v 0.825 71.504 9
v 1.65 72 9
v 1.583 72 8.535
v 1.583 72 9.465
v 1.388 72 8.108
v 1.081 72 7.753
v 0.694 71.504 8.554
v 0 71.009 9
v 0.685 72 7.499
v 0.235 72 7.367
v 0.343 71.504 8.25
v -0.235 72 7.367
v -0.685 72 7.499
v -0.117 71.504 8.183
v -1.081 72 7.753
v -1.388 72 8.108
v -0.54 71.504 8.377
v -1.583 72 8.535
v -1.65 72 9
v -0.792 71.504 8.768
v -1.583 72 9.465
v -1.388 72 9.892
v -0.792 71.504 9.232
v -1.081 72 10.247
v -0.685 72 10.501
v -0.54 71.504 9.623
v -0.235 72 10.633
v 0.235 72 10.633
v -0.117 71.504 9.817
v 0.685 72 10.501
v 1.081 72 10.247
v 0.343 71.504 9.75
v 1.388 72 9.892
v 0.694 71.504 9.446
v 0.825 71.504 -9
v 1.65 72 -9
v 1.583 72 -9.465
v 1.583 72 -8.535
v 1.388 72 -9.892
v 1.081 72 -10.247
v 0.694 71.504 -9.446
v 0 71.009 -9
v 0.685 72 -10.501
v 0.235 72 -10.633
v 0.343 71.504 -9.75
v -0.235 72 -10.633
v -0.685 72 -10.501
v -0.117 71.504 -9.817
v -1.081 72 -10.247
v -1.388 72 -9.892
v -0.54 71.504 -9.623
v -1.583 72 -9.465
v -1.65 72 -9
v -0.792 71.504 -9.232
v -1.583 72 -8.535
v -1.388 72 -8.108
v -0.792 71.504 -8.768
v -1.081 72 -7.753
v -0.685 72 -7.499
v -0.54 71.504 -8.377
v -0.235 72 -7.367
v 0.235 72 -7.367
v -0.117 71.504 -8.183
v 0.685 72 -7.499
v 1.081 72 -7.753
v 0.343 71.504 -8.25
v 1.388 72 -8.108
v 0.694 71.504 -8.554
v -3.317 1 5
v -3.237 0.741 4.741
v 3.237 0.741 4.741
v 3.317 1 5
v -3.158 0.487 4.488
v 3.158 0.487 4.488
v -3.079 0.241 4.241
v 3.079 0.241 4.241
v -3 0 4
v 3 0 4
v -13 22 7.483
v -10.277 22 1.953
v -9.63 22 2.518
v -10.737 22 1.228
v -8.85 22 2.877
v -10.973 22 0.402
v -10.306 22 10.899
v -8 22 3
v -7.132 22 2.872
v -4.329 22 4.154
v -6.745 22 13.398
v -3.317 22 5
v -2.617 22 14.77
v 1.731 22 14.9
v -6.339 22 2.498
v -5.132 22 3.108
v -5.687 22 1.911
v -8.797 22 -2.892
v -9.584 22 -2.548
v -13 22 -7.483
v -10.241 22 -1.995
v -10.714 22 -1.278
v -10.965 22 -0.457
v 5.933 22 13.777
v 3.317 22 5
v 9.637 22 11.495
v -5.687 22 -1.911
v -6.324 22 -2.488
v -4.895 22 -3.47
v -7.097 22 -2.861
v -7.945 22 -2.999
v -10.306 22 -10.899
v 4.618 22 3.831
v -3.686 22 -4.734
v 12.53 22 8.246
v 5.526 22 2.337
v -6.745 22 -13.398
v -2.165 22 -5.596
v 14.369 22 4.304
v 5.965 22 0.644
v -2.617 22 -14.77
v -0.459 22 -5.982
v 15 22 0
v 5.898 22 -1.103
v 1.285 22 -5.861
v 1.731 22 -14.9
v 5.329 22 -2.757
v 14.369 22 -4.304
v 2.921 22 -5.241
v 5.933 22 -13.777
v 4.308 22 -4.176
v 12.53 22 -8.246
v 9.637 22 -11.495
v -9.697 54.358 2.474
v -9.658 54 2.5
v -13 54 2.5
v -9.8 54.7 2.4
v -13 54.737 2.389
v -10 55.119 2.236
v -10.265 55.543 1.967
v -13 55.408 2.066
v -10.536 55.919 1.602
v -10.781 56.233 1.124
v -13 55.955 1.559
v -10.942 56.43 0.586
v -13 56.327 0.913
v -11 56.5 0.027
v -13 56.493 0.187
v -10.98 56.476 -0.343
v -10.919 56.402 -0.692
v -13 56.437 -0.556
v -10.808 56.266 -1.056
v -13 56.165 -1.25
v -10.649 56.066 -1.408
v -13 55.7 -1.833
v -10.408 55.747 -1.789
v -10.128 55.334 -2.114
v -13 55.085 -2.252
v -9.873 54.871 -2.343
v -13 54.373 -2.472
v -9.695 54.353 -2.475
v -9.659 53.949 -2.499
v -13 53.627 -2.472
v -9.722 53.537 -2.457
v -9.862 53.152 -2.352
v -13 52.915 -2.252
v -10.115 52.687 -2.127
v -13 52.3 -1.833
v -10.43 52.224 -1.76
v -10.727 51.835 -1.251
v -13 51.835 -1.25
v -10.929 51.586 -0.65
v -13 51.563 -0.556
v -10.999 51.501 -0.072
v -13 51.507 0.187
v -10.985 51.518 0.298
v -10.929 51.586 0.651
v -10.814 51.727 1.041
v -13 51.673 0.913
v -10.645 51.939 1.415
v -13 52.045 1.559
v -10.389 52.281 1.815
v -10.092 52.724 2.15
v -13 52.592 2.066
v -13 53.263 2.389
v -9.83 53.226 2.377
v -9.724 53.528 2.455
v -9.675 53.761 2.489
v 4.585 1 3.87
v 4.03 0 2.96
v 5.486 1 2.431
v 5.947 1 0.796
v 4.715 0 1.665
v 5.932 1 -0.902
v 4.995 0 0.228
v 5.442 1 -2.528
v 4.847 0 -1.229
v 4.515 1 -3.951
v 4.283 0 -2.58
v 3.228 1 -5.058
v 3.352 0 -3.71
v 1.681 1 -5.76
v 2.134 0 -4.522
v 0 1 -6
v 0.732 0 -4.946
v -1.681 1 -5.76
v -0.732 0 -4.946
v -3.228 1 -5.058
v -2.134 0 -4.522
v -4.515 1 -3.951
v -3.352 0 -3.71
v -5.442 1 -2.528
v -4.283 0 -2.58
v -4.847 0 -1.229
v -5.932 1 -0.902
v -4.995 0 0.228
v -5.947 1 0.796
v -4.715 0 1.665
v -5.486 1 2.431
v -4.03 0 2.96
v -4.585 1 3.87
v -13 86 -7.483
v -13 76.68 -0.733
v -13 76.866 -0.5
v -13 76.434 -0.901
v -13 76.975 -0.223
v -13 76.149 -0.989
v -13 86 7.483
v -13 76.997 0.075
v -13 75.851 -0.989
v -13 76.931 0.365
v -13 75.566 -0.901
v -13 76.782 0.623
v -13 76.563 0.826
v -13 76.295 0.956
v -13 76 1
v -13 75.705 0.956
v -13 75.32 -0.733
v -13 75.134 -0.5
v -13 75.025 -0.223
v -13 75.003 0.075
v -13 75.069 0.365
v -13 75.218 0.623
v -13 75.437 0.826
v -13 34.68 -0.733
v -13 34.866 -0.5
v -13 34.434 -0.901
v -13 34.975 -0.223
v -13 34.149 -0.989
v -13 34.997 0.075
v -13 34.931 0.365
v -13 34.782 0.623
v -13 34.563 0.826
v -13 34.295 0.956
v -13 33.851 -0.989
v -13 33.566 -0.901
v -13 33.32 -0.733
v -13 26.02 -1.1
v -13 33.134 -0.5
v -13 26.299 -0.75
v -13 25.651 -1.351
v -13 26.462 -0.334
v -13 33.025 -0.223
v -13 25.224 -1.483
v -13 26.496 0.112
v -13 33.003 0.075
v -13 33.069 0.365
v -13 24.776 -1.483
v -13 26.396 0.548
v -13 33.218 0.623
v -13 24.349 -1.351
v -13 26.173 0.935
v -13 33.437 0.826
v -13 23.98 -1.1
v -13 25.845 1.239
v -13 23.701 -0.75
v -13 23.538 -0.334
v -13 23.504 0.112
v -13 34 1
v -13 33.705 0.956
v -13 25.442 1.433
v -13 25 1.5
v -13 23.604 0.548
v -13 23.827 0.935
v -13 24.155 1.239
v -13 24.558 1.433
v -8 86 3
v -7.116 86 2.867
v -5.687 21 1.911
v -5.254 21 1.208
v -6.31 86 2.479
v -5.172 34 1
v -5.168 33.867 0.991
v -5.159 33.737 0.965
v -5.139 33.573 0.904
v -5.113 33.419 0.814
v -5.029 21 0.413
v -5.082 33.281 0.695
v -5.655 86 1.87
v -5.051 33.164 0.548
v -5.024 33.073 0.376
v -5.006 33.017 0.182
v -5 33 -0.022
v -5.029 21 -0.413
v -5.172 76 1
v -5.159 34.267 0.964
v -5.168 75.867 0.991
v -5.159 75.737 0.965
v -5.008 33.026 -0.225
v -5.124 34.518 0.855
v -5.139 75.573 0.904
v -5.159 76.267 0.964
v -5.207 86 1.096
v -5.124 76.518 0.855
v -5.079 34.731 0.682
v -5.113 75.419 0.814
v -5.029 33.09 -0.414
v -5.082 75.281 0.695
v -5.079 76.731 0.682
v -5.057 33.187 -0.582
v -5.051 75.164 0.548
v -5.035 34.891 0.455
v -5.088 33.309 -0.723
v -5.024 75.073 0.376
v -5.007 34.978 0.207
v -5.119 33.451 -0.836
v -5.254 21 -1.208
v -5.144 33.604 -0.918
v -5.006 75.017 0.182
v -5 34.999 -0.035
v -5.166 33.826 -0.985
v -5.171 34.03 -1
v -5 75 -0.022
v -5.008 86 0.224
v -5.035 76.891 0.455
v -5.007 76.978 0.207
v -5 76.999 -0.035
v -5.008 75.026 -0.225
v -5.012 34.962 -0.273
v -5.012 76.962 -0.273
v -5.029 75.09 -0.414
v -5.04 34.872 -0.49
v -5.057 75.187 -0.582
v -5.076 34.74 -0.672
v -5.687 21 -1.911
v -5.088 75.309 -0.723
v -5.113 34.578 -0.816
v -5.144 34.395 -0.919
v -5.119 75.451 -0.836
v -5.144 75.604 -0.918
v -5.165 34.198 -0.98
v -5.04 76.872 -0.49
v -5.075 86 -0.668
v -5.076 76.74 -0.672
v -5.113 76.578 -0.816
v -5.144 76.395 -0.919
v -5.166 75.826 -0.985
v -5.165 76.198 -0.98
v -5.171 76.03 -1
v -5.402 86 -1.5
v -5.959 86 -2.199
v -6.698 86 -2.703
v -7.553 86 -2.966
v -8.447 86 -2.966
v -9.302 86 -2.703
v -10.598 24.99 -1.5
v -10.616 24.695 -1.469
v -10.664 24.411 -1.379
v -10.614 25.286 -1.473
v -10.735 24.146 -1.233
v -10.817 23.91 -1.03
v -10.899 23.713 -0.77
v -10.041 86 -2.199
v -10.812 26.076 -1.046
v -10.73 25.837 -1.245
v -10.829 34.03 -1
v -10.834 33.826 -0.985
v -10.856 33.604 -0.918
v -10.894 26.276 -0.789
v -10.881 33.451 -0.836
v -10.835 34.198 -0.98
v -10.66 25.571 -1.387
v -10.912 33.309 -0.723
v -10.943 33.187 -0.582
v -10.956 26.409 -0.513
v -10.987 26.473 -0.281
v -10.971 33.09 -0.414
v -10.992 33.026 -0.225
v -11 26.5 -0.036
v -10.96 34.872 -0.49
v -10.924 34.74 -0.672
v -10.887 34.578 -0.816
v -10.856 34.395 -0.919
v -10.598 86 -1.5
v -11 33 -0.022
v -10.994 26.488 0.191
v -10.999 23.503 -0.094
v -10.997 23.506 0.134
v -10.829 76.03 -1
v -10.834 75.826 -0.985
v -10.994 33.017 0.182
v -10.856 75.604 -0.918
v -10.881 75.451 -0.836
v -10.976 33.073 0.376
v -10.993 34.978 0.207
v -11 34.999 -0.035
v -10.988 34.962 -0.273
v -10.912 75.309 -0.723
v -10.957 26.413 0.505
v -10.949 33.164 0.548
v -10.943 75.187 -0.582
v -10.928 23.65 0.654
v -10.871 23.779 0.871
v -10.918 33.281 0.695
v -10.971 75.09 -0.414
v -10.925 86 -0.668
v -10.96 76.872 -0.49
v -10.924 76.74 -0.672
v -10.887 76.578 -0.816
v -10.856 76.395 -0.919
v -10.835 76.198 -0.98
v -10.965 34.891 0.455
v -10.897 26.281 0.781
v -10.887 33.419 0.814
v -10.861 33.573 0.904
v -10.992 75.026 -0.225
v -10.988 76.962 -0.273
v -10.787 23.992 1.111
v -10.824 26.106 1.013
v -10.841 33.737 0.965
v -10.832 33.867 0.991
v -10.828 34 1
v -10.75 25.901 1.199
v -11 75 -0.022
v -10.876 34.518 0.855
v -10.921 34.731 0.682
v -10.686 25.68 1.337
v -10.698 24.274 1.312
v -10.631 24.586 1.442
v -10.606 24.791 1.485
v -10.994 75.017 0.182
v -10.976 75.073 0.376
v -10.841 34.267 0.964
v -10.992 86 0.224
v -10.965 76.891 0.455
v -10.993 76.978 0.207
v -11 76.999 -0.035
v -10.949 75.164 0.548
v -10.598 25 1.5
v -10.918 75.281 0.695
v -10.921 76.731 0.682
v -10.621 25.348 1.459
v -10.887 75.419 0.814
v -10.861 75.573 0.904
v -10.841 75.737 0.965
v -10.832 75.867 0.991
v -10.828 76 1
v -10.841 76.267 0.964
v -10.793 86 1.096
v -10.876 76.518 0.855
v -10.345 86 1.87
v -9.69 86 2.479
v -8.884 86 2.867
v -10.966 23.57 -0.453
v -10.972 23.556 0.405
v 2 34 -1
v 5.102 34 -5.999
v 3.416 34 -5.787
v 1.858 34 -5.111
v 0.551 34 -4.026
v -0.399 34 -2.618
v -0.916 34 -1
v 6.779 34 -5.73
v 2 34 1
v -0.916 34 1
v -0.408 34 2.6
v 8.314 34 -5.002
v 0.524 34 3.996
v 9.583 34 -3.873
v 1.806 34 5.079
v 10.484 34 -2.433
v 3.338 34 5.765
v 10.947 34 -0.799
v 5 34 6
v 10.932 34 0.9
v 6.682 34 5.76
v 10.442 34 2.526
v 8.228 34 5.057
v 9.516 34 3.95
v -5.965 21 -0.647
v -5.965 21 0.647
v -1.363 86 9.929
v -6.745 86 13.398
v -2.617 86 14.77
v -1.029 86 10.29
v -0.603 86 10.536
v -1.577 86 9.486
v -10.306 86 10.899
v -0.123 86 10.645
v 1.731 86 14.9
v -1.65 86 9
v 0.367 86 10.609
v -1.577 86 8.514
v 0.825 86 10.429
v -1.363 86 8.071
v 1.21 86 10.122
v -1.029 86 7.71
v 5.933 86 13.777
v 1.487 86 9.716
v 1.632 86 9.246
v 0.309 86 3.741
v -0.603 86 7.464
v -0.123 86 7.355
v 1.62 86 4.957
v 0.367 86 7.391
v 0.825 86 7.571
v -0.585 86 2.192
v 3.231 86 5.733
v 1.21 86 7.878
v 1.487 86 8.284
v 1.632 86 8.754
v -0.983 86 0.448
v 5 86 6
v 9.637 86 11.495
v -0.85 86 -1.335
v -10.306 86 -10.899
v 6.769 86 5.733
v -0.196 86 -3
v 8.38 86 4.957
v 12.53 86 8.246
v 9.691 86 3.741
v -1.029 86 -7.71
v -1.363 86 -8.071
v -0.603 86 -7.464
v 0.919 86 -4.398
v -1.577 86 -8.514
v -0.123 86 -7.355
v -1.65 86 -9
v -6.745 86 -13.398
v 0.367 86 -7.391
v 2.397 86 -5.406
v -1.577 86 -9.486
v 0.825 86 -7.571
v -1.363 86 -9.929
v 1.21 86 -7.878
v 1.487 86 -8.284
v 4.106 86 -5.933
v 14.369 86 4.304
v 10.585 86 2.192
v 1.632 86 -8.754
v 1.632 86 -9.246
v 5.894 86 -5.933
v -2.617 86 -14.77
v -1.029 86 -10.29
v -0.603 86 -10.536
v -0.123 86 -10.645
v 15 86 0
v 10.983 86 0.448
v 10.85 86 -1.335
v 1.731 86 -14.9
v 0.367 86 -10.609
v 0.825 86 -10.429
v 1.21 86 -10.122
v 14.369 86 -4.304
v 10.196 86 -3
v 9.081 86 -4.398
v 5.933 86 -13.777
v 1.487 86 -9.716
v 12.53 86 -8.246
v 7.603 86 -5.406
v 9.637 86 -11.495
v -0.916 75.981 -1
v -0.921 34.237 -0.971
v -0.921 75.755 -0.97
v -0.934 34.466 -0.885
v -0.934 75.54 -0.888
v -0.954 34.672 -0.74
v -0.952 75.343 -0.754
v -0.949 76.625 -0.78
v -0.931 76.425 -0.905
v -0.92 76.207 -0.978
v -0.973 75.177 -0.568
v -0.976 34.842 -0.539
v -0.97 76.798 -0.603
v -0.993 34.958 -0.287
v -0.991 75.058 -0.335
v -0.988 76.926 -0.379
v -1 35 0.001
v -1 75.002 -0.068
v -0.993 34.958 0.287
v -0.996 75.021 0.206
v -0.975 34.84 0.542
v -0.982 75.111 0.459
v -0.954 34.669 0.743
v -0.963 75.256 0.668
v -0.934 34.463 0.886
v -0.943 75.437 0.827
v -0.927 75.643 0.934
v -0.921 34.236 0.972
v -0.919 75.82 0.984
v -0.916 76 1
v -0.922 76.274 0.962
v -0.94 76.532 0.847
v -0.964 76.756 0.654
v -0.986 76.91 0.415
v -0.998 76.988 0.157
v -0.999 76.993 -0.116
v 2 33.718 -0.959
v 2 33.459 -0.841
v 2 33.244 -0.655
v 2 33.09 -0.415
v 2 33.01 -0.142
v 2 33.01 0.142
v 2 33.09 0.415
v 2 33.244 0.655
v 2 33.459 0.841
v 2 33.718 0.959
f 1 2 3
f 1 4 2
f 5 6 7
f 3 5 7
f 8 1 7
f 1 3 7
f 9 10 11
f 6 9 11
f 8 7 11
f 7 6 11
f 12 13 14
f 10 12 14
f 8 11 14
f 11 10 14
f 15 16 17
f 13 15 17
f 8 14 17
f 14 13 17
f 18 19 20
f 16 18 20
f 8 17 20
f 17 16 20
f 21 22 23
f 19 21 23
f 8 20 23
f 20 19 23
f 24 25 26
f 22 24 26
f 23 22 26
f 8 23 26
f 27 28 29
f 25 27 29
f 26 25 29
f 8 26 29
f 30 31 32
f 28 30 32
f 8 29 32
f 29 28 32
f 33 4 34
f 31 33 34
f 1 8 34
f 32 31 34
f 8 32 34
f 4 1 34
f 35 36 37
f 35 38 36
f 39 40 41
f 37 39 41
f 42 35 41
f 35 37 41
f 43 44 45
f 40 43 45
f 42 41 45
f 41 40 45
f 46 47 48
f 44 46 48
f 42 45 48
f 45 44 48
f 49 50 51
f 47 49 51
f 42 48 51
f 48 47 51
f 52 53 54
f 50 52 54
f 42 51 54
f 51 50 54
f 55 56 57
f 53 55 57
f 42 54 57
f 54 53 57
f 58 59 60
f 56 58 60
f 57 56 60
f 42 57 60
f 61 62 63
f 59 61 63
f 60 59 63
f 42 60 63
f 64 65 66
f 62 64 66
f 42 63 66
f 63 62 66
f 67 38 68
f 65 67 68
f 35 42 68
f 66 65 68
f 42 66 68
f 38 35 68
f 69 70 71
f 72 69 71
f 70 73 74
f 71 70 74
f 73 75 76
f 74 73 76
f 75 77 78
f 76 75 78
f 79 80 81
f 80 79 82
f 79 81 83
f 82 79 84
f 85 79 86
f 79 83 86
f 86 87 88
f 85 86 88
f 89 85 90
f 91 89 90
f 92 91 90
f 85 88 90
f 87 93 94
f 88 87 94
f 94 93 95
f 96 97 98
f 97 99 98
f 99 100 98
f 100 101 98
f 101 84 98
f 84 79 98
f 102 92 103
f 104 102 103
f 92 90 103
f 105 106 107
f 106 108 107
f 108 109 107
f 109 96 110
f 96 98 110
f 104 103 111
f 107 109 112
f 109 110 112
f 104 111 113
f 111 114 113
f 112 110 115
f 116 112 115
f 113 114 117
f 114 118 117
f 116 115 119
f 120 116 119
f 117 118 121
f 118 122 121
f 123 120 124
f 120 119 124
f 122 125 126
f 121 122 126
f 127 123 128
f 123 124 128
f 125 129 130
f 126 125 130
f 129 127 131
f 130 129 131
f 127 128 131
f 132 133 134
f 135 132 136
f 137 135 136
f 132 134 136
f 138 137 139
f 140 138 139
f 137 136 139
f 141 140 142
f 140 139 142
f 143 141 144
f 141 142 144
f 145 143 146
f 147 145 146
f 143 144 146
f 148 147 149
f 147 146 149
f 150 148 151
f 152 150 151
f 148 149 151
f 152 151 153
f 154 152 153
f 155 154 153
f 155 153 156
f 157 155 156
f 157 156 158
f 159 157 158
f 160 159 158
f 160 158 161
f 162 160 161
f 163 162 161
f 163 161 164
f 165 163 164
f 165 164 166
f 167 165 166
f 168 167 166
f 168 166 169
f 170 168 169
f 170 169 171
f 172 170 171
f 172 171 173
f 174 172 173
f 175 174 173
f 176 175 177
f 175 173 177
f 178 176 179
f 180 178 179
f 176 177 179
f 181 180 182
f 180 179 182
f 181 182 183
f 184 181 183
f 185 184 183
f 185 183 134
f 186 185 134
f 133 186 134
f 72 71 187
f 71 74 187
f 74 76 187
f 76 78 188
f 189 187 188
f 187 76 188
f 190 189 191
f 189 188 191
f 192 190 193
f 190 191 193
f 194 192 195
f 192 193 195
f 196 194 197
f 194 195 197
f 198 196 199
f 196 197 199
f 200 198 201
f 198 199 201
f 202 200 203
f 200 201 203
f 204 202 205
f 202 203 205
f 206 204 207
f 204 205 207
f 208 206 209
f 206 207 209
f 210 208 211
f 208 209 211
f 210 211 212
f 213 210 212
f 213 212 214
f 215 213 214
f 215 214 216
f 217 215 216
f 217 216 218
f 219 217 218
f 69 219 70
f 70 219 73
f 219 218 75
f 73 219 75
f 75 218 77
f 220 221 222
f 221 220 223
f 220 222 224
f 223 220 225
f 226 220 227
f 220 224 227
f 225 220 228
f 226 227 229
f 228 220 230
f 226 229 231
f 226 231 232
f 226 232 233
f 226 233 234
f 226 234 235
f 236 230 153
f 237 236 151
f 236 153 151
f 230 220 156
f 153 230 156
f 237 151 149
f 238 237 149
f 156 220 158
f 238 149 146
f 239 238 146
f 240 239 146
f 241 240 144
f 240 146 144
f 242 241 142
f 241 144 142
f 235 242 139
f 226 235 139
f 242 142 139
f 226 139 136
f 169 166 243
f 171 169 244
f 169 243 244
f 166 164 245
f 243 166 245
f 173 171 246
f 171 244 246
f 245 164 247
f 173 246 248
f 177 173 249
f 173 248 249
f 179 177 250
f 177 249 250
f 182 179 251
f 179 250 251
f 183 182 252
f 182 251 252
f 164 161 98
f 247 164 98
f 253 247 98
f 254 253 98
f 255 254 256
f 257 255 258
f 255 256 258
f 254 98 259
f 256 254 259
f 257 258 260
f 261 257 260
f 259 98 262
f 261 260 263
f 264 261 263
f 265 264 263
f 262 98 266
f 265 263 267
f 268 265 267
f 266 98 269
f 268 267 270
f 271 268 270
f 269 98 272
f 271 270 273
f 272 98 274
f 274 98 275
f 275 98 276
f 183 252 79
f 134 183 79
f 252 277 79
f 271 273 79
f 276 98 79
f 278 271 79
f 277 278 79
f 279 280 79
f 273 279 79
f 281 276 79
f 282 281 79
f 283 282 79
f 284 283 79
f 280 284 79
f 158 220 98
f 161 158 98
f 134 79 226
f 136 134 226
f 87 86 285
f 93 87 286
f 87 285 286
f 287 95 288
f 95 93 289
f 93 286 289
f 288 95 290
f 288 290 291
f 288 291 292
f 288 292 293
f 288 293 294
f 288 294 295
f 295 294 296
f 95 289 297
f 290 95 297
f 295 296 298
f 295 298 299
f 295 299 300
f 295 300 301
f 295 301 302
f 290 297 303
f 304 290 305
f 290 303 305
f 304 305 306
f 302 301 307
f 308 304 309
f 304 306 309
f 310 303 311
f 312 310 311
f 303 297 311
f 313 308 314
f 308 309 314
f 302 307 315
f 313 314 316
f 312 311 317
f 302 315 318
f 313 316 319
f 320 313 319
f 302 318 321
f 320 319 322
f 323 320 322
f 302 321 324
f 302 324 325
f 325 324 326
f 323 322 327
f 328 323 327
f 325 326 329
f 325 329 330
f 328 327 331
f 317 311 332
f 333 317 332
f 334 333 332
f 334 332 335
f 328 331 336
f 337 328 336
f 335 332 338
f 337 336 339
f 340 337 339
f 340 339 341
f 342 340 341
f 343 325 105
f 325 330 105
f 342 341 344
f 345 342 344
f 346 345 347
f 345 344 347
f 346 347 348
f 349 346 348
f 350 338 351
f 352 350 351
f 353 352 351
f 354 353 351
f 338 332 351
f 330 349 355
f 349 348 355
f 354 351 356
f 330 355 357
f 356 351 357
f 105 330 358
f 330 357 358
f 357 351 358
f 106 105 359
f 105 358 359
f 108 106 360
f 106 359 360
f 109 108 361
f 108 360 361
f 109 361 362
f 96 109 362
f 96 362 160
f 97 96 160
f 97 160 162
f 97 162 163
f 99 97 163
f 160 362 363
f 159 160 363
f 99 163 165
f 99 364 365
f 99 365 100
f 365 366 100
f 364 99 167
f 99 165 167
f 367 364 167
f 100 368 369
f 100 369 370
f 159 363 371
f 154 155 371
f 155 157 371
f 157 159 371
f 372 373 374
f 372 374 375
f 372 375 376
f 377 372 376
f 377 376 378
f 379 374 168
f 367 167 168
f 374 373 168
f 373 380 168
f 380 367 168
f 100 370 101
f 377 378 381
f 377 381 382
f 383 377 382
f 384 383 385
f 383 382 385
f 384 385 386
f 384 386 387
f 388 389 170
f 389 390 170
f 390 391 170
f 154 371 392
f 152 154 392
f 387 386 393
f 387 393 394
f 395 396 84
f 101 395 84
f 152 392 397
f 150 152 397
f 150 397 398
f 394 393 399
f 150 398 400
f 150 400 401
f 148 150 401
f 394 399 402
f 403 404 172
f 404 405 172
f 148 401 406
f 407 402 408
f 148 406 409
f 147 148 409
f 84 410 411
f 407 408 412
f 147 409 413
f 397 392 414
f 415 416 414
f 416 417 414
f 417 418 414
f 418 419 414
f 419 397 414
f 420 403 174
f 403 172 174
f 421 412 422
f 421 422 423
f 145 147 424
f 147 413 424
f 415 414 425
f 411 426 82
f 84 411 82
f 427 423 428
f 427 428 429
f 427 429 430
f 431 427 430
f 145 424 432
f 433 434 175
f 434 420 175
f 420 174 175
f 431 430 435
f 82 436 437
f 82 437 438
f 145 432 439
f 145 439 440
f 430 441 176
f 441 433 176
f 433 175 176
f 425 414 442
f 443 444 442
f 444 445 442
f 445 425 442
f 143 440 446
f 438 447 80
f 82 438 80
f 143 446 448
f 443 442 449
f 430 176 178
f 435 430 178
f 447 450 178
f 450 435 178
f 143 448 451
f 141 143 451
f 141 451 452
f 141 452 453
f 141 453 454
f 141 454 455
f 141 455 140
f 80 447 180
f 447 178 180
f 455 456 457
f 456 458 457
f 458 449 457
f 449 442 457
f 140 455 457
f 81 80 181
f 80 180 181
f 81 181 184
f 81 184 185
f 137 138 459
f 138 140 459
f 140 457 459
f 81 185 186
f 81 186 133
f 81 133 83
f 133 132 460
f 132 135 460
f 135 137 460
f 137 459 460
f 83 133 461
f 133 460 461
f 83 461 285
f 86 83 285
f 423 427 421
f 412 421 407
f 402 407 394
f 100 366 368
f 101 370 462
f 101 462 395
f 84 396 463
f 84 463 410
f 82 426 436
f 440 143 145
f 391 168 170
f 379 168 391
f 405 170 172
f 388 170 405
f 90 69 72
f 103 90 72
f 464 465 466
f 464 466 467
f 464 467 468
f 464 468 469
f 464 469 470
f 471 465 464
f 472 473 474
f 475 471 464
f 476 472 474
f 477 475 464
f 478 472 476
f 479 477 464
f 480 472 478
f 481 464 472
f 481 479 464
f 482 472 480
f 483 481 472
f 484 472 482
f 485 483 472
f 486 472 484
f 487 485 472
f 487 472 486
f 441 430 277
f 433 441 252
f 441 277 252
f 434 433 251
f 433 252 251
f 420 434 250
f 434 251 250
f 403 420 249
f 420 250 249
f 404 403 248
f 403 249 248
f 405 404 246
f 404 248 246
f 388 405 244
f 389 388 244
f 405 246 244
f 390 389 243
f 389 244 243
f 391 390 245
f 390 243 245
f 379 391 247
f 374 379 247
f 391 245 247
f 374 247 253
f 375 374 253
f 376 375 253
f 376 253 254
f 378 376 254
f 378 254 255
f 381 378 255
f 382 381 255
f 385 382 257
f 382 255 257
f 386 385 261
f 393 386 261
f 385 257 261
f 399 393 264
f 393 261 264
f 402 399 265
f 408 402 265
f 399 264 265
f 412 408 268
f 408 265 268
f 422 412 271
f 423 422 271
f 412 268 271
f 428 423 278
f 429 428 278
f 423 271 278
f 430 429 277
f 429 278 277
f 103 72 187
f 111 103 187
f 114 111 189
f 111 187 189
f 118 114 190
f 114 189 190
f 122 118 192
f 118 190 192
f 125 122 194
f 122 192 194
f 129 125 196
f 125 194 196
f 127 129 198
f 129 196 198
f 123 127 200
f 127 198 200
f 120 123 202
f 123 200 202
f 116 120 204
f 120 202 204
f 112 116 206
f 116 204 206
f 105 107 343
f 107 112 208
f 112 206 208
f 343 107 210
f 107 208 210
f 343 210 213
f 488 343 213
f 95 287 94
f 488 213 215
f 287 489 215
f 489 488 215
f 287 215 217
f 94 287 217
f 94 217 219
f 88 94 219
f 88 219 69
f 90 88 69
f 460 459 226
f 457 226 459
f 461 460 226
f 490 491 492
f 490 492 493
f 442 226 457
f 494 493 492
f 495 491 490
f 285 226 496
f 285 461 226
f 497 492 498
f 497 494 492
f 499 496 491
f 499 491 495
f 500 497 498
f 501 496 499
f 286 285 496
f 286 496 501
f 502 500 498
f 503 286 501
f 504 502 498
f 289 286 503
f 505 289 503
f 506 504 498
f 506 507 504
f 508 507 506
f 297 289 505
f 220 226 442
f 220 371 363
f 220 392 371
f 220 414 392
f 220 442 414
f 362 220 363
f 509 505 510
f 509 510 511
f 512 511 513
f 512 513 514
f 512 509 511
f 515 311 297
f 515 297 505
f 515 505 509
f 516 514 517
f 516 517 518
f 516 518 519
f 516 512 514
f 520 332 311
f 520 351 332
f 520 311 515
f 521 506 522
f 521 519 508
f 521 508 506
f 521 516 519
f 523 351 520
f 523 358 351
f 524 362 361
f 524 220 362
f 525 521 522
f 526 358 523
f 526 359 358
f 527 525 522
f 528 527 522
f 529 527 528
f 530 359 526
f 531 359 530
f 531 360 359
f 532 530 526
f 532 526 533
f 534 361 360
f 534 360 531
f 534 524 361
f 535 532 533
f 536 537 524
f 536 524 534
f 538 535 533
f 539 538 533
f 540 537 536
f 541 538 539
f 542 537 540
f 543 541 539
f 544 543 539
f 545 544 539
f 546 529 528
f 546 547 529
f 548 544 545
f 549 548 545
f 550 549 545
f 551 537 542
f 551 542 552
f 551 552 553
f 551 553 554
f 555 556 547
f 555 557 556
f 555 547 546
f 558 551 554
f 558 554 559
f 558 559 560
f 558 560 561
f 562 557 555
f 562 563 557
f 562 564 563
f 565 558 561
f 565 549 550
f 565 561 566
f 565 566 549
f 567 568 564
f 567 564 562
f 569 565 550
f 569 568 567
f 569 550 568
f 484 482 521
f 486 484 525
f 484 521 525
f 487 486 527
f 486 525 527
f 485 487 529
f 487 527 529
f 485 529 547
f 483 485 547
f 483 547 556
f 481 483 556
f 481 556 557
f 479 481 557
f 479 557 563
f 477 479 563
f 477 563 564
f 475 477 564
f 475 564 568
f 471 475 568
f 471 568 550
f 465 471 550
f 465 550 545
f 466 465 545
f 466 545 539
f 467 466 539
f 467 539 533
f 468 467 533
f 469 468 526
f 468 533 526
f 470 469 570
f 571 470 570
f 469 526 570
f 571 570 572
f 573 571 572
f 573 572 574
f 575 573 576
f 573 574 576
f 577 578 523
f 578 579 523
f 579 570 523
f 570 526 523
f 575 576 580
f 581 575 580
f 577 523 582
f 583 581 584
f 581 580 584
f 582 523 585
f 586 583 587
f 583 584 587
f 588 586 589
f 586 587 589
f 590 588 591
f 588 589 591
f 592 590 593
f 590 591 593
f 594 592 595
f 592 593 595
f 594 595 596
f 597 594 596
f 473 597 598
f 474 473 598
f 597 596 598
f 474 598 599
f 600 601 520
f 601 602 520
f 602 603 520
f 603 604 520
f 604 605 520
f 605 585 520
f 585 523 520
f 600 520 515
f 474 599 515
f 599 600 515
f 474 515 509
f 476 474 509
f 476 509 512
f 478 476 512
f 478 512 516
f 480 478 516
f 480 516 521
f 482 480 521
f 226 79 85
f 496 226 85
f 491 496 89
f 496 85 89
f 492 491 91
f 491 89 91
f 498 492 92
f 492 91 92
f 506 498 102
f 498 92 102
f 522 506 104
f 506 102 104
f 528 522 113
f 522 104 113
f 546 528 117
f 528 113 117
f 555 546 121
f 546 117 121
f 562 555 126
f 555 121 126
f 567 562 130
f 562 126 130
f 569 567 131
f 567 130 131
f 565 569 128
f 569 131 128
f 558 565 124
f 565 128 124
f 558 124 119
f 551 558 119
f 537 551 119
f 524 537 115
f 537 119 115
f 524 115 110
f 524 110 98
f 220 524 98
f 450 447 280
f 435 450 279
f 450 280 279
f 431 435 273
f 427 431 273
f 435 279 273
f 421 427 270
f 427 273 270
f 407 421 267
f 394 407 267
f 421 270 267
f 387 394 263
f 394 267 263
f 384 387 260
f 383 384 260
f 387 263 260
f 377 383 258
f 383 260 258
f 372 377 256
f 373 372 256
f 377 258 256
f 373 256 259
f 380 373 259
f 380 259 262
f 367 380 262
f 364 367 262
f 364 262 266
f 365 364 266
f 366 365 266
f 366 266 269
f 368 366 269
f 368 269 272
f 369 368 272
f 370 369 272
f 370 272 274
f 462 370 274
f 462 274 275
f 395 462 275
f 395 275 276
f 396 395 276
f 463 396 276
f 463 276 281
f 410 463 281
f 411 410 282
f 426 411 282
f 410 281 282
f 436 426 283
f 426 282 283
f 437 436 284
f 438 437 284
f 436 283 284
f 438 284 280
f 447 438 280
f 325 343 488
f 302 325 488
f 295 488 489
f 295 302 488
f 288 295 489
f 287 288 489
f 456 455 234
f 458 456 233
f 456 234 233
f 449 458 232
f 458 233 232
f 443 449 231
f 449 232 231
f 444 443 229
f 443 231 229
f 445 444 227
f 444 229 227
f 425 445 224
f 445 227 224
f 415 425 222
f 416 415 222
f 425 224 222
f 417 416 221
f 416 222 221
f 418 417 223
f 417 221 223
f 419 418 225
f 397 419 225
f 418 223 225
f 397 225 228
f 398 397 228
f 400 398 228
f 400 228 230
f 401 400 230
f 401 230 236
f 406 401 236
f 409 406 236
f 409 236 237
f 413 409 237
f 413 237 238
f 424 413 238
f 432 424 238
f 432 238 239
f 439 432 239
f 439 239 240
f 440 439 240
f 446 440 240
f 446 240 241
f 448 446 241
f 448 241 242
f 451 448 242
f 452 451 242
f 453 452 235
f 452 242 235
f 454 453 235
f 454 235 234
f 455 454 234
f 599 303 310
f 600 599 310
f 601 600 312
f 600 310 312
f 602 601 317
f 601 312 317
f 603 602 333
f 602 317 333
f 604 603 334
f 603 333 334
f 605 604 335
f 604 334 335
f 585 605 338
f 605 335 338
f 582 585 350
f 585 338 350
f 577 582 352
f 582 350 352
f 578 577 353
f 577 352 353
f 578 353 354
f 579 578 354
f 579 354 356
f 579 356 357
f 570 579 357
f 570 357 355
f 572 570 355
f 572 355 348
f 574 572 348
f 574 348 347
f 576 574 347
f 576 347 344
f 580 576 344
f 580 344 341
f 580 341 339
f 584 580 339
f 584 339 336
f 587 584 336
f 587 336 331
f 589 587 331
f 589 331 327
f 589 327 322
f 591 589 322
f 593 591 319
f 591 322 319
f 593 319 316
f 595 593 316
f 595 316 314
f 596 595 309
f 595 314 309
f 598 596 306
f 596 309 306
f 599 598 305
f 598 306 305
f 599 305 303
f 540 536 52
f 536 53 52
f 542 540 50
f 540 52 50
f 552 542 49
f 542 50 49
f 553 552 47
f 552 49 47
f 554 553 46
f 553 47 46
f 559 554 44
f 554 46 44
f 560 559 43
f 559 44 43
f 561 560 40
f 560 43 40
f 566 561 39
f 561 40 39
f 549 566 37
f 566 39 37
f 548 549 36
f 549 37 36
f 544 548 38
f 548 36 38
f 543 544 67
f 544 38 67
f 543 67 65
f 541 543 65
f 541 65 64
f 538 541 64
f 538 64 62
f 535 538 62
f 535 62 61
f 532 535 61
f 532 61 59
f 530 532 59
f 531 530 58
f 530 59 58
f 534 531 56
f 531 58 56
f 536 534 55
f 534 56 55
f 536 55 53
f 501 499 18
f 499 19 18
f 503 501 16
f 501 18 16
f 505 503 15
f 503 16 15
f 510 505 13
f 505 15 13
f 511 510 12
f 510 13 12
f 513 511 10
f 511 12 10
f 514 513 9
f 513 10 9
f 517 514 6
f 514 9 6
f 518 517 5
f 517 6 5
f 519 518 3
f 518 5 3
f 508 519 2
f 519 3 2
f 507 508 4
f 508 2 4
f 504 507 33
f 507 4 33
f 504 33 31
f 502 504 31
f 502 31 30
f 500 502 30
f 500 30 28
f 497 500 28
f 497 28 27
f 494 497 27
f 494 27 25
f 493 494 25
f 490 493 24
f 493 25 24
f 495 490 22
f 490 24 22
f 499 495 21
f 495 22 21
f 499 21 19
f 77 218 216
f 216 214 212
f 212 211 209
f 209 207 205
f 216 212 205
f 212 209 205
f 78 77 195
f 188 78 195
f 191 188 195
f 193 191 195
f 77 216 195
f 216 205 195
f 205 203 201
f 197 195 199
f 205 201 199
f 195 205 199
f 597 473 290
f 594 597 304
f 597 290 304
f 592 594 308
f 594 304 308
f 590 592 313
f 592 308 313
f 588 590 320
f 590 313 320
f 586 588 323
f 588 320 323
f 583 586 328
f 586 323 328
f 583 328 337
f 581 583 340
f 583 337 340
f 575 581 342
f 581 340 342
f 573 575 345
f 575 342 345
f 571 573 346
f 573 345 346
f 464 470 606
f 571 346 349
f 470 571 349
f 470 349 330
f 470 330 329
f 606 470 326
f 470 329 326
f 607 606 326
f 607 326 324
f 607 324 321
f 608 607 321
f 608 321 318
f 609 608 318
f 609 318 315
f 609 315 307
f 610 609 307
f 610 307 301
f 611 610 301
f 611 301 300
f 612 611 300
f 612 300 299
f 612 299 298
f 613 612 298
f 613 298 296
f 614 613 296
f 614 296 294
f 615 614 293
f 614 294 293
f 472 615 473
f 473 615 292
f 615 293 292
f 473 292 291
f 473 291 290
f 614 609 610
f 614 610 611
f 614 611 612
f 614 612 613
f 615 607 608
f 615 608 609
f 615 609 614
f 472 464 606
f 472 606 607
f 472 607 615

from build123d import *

# Parameters (mm, degrees)
BOSS_EXTRUDE1_DEPTH     = 22
BOSS_EXTRUDE2_DEPTH     = 64
SKETCH3_R               = 3
CUT_EXTRUDE1_DEPTH      = 65
SKETCH4_R               = 6
CUT_EXTRUDE2_DEPTH      = 52
M4_TAPPED_HOLE1_D       = 3.3
M4_TAPPED_HOLE1_DEPTH   = 14
M4_TAPPED_HOLE1_TIP     = 0.991420021
CUT_EXTRUDE3_REACH      = 93.679
CUT_EXTRUDE3_END_RADIUS = 3
SKETCH8_R               = 2.5
SKETCH8_R_2             = 1.5
SKETCH9_R               = 1
CUT_EXTRUDE4_DEPTH      = 15
CHAMFER1_SIZE           = 1


with BuildPart() as part:
    # Sketch1 → Boss-Extrude1 (new body)
    with BuildSketch(Plane(origin=(0, 0, 0), x_dir=(1, 0, 0), z_dir=(0, 1, 0))):
        with BuildLine():
            Line((-3.31662479, -5), (3.31662479, -5))
            ThreePointArc((3.31662479, -5), (0, 6), (-3.31662479, -5))
        make_face()
    extrude(amount=BOSS_EXTRUDE1_DEPTH)

    # Sketch2 → Boss-Extrude2 (add)
    with BuildSketch(Plane(origin=(0, 22, 0), x_dir=(1, 0, 0), z_dir=(0, 1, 0))):
        with BuildLine():
            Line((-13, 7.483314774), (-13, -7.483314774))
            ThreePointArc((-13, -7.483314774), (15, 0), (-13, 7.483314774))
        make_face()
    extrude(amount=BOSS_EXTRUDE2_DEPTH)

    # Sketch3 → Cut-Extrude1 (cut)
    with BuildSketch(Plane(origin=(0, 86, 0), x_dir=(1, 0, 0), z_dir=(0, 1, 0))):
        with Locations(Location((-8, 0, 0), (0, 0, 270))):
            Circle(SKETCH3_R)
    extrude(amount=-CUT_EXTRUDE1_DEPTH, mode=Mode.SUBTRACT)

    # Sketch4 → Cut-Extrude2 (cut)
    with BuildSketch(Plane(origin=(0, 86, 0), x_dir=(1, 0, 0), z_dir=(0, 1, 0))):
        with Locations(Location((5, 0, 0), (0, 0, 270))):
            Circle(SKETCH4_R)
    extrude(amount=-CUT_EXTRUDE2_DEPTH, mode=Mode.SUBTRACT)

    # M4 Tapped Hole1
    with Locations(Plane(origin=(0, 86, 0), x_dir=(1, 0, 0), z_dir=(0, 1, 0))):
        with Locations((0, 9), (0, -9)):
            Hole(M4_TAPPED_HOLE1_D / 2, depth=M4_TAPPED_HOLE1_DEPTH)
            with Locations((0, 0, -(M4_TAPPED_HOLE1_DEPTH + M4_TAPPED_HOLE1_TIP / 2))):  # 118° drill point
                Cone(0, M4_TAPPED_HOLE1_D / 2, M4_TAPPED_HOLE1_TIP, mode=Mode.SUBTRACT)

    # Cut-Extrude3: up to this cylinder (the profile starts outside it)
    cut_extrude3_end = Plane(origin=(-8, 39.5, 0), z_dir=(0, 1, 0)) * Cylinder(CUT_EXTRUDE3_END_RADIUS, 223.358, mode=Mode.PRIVATE)
    # Sketch8 → Cut-Extrude3 (cut, up to the surface)
    with BuildSketch(Plane.ZY.offset(13), mode=Mode.PRIVATE) as cut_extrude3_sk1:
        with Locations((0, 54)):
            Circle(SKETCH8_R)
    cut_extrude3_tool1 = extrude(cut_extrude3_sk1.sketch, amount=-CUT_EXTRUDE3_REACH, mode=Mode.PRIVATE) - cut_extrude3_end
    add(cut_extrude3_tool1.solids().sort_by_distance((-13, 54, 0))[0], mode=Mode.SUBTRACT)
    # Sketch8 → Cut-Extrude3 (cut, up to the surface)
    with BuildSketch(Plane.ZY.offset(13), mode=Mode.PRIVATE) as cut_extrude3_sk2:
        with Locations((0, 25)):
            Circle(SKETCH8_R_2)
    cut_extrude3_tool2 = extrude(cut_extrude3_sk2.sketch, amount=-CUT_EXTRUDE3_REACH, mode=Mode.PRIVATE) - cut_extrude3_end
    add(cut_extrude3_tool2.solids().sort_by_distance((-13, 25, 0))[0], mode=Mode.SUBTRACT)

    # Sketch9 → Cut-Extrude4 (cut)
    with BuildSketch(Plane.ZY.offset(13)):
        with Locations((0, 76)):
            Circle(SKETCH9_R)
        with Locations((0, 34)):
            Circle(SKETCH9_R)
    extrude(amount=-CUT_EXTRUDE4_DEPTH, mode=Mode.SUBTRACT)

    # Chamfer1
    chamfer1_edges = [part.edges().sort_by_distance(p)[0] for p in [
        (0, 0, 5),
        (0, 0, -6),
    ]]
    chamfer(chamfer1_edges, length=CHAMFER1_SIZE - 0.0001)  # a hair under: the kernel refuses the full size


solid = part.part
